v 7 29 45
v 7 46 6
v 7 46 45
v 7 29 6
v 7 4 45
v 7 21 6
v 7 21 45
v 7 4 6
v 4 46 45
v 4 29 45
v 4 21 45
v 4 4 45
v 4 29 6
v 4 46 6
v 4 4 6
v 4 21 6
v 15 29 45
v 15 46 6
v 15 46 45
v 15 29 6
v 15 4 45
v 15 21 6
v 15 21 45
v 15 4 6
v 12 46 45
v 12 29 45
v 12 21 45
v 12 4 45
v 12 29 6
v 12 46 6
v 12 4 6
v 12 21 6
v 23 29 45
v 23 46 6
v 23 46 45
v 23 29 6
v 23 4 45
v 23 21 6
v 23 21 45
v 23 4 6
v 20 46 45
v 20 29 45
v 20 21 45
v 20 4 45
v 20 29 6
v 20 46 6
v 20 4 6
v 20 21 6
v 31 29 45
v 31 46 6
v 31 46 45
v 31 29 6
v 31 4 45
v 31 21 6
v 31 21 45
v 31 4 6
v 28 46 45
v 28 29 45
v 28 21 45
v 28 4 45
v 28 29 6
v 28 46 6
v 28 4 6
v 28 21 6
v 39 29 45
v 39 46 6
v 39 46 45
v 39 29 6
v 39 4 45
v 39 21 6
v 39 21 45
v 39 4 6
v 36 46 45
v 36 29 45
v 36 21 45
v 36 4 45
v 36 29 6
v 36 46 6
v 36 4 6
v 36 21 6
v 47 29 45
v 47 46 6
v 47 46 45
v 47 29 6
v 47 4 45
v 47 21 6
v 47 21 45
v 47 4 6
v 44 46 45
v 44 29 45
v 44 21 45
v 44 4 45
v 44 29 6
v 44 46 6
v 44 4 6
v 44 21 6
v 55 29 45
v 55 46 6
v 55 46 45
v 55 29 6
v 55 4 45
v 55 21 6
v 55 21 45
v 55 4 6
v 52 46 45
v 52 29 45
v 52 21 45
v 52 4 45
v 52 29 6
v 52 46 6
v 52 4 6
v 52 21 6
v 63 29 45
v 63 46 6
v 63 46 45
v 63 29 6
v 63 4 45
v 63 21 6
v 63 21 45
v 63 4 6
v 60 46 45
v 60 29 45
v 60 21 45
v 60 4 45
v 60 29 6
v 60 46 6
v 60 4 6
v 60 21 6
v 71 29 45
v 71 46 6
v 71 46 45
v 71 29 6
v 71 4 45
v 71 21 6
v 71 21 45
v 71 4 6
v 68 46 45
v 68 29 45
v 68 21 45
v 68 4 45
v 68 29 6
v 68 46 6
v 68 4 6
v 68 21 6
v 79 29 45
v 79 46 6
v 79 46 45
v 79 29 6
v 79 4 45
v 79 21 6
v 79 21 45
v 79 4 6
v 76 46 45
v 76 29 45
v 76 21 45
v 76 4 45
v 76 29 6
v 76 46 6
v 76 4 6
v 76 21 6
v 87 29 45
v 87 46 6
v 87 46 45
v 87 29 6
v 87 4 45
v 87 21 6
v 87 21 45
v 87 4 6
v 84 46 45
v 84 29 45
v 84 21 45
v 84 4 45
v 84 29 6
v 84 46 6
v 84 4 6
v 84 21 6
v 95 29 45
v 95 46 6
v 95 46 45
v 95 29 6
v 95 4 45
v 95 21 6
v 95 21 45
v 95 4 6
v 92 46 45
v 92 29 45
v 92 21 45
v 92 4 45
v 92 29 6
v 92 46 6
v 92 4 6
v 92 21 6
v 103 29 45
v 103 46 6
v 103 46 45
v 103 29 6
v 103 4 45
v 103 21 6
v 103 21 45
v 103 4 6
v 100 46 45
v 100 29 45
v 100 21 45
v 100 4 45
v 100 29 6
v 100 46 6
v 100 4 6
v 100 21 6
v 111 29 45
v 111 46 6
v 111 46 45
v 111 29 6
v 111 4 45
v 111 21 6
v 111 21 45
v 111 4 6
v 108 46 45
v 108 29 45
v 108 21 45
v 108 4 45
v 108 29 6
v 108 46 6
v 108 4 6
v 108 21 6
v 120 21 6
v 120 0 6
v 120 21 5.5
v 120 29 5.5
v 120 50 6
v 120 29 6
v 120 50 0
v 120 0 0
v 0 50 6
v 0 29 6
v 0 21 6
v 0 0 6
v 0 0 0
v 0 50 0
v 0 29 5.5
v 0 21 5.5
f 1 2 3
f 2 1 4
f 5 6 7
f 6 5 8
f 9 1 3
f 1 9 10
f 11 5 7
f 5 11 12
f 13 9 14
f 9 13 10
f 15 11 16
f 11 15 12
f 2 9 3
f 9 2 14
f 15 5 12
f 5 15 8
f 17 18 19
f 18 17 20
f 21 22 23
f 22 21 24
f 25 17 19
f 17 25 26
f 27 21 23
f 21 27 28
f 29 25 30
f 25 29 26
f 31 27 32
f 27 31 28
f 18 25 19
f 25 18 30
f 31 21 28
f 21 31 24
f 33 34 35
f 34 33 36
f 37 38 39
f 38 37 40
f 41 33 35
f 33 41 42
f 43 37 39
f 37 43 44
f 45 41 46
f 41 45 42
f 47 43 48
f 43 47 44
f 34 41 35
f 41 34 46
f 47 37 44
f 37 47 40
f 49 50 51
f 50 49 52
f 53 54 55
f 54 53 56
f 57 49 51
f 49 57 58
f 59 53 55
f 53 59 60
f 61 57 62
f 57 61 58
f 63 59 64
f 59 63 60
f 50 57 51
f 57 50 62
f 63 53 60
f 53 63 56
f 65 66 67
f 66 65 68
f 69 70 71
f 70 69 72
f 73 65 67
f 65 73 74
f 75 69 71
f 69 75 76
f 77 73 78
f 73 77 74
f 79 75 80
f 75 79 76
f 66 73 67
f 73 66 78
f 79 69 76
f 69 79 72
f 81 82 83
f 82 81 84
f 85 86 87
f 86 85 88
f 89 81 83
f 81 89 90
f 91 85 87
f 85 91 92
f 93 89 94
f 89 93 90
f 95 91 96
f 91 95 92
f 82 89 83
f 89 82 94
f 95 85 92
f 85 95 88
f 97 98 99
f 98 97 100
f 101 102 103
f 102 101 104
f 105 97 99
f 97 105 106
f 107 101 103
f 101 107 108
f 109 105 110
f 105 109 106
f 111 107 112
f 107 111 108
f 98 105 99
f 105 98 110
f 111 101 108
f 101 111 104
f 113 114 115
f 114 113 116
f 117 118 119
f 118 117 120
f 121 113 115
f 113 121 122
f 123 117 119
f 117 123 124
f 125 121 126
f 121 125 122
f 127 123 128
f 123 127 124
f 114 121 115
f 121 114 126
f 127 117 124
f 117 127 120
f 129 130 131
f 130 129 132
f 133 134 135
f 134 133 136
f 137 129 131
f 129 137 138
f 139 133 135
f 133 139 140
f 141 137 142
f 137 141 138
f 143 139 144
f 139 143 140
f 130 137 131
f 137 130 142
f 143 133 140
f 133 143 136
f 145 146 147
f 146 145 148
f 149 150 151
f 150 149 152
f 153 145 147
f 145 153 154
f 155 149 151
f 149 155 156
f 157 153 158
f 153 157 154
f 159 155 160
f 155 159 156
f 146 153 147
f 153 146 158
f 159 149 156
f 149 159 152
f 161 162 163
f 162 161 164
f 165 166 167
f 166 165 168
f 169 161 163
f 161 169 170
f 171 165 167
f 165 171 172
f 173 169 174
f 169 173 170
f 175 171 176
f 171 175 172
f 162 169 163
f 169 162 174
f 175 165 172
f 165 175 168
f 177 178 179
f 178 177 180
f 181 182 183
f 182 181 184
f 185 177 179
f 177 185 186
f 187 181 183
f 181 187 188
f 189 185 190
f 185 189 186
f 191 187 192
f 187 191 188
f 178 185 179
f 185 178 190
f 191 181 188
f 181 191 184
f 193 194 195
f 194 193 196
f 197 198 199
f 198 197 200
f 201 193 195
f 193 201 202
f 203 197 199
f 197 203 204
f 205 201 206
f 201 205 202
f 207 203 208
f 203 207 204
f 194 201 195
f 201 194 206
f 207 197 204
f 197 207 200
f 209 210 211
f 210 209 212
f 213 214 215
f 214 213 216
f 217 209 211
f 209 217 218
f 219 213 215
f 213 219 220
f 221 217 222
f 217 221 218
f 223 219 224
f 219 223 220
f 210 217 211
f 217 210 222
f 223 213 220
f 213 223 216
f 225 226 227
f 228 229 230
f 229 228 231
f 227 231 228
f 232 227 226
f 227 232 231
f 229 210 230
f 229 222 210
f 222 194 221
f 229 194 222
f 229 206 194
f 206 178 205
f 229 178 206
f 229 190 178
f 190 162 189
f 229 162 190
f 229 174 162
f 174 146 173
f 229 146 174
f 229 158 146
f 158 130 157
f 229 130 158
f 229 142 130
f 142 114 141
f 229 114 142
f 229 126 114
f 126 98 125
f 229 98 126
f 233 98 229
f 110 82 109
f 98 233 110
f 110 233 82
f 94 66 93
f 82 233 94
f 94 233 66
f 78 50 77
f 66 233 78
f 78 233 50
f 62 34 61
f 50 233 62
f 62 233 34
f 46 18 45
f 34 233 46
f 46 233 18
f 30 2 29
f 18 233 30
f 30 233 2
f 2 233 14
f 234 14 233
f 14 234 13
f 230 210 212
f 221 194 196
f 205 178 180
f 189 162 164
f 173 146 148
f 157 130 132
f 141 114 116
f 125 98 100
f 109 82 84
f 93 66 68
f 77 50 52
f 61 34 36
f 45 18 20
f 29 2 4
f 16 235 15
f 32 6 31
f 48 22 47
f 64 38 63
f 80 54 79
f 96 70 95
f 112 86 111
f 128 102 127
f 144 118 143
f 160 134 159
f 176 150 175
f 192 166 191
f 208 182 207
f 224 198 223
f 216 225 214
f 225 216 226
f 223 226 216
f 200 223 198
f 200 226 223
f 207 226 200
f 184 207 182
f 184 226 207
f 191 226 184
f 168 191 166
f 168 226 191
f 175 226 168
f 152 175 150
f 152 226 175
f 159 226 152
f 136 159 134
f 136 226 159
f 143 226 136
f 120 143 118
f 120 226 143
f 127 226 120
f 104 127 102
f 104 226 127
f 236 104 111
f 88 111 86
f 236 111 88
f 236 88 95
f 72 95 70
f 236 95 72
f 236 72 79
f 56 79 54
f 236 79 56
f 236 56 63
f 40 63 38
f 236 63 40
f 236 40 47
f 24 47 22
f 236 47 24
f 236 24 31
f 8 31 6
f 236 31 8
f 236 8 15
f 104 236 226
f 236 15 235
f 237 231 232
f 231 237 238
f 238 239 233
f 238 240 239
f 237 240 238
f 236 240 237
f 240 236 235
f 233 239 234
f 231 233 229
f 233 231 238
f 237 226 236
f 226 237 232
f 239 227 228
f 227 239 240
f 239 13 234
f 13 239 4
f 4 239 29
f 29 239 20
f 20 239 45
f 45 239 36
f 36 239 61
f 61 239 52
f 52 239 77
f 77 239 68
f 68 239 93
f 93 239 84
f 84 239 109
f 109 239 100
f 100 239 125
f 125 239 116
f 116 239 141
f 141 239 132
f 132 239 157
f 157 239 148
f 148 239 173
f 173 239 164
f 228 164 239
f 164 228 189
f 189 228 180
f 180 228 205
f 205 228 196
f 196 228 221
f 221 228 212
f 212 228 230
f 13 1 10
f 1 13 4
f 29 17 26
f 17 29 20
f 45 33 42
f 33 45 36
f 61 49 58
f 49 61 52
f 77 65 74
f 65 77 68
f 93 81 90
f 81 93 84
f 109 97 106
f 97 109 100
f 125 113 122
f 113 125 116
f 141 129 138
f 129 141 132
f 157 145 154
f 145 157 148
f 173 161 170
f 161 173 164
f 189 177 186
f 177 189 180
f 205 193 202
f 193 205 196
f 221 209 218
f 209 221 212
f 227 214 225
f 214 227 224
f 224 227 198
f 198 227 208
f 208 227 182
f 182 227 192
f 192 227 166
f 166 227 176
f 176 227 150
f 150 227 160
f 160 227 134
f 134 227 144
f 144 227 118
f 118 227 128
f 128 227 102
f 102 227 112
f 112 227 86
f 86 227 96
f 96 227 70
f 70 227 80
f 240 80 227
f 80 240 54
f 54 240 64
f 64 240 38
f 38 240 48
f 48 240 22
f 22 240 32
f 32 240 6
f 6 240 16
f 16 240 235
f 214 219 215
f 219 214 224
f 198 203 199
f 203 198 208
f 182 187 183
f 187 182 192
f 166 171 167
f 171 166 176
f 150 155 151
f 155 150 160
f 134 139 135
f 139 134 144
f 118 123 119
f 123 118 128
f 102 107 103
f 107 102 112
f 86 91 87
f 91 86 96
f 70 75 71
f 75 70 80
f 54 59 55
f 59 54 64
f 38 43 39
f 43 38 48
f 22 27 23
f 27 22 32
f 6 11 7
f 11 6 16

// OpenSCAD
$fn = 32;

// ----------------------------------------------------------------------
// Heatsink: slotted fin block
// ----------------------------------------------------------------------

// --- parameters (mm) ---
base_l = 120;             // base length, X
base_w = 50;              // base width, Y
base_t = 6;               // base plate thickness
fin_h = 40;               // fin height above the base
fin_t = 3;                // fin thickness
edge = 4;                 // margin from the base ends
pitch = 8;                // fin pitch
slot_w = 8;               // central slot width, Y

n_fins = floor((base_l - 2 * edge - fin_t) / pitch) + 1;  // fin count
total_h = base_t + fin_h - 1;  // overall height

difference() {
union() {
  cube([base_l, base_w, base_t]);
  for (i = [0 : n_fins - 1])
    translate([edge + i * pitch, edge, base_t - 1])
      cube([fin_t, base_w - 2 * edge, fin_h]);
}
  translate([-1, base_w / 2 - slot_w / 2, base_t - 0.5])
    cube([base_l + 2, slot_w, fin_h + 2]);
}
